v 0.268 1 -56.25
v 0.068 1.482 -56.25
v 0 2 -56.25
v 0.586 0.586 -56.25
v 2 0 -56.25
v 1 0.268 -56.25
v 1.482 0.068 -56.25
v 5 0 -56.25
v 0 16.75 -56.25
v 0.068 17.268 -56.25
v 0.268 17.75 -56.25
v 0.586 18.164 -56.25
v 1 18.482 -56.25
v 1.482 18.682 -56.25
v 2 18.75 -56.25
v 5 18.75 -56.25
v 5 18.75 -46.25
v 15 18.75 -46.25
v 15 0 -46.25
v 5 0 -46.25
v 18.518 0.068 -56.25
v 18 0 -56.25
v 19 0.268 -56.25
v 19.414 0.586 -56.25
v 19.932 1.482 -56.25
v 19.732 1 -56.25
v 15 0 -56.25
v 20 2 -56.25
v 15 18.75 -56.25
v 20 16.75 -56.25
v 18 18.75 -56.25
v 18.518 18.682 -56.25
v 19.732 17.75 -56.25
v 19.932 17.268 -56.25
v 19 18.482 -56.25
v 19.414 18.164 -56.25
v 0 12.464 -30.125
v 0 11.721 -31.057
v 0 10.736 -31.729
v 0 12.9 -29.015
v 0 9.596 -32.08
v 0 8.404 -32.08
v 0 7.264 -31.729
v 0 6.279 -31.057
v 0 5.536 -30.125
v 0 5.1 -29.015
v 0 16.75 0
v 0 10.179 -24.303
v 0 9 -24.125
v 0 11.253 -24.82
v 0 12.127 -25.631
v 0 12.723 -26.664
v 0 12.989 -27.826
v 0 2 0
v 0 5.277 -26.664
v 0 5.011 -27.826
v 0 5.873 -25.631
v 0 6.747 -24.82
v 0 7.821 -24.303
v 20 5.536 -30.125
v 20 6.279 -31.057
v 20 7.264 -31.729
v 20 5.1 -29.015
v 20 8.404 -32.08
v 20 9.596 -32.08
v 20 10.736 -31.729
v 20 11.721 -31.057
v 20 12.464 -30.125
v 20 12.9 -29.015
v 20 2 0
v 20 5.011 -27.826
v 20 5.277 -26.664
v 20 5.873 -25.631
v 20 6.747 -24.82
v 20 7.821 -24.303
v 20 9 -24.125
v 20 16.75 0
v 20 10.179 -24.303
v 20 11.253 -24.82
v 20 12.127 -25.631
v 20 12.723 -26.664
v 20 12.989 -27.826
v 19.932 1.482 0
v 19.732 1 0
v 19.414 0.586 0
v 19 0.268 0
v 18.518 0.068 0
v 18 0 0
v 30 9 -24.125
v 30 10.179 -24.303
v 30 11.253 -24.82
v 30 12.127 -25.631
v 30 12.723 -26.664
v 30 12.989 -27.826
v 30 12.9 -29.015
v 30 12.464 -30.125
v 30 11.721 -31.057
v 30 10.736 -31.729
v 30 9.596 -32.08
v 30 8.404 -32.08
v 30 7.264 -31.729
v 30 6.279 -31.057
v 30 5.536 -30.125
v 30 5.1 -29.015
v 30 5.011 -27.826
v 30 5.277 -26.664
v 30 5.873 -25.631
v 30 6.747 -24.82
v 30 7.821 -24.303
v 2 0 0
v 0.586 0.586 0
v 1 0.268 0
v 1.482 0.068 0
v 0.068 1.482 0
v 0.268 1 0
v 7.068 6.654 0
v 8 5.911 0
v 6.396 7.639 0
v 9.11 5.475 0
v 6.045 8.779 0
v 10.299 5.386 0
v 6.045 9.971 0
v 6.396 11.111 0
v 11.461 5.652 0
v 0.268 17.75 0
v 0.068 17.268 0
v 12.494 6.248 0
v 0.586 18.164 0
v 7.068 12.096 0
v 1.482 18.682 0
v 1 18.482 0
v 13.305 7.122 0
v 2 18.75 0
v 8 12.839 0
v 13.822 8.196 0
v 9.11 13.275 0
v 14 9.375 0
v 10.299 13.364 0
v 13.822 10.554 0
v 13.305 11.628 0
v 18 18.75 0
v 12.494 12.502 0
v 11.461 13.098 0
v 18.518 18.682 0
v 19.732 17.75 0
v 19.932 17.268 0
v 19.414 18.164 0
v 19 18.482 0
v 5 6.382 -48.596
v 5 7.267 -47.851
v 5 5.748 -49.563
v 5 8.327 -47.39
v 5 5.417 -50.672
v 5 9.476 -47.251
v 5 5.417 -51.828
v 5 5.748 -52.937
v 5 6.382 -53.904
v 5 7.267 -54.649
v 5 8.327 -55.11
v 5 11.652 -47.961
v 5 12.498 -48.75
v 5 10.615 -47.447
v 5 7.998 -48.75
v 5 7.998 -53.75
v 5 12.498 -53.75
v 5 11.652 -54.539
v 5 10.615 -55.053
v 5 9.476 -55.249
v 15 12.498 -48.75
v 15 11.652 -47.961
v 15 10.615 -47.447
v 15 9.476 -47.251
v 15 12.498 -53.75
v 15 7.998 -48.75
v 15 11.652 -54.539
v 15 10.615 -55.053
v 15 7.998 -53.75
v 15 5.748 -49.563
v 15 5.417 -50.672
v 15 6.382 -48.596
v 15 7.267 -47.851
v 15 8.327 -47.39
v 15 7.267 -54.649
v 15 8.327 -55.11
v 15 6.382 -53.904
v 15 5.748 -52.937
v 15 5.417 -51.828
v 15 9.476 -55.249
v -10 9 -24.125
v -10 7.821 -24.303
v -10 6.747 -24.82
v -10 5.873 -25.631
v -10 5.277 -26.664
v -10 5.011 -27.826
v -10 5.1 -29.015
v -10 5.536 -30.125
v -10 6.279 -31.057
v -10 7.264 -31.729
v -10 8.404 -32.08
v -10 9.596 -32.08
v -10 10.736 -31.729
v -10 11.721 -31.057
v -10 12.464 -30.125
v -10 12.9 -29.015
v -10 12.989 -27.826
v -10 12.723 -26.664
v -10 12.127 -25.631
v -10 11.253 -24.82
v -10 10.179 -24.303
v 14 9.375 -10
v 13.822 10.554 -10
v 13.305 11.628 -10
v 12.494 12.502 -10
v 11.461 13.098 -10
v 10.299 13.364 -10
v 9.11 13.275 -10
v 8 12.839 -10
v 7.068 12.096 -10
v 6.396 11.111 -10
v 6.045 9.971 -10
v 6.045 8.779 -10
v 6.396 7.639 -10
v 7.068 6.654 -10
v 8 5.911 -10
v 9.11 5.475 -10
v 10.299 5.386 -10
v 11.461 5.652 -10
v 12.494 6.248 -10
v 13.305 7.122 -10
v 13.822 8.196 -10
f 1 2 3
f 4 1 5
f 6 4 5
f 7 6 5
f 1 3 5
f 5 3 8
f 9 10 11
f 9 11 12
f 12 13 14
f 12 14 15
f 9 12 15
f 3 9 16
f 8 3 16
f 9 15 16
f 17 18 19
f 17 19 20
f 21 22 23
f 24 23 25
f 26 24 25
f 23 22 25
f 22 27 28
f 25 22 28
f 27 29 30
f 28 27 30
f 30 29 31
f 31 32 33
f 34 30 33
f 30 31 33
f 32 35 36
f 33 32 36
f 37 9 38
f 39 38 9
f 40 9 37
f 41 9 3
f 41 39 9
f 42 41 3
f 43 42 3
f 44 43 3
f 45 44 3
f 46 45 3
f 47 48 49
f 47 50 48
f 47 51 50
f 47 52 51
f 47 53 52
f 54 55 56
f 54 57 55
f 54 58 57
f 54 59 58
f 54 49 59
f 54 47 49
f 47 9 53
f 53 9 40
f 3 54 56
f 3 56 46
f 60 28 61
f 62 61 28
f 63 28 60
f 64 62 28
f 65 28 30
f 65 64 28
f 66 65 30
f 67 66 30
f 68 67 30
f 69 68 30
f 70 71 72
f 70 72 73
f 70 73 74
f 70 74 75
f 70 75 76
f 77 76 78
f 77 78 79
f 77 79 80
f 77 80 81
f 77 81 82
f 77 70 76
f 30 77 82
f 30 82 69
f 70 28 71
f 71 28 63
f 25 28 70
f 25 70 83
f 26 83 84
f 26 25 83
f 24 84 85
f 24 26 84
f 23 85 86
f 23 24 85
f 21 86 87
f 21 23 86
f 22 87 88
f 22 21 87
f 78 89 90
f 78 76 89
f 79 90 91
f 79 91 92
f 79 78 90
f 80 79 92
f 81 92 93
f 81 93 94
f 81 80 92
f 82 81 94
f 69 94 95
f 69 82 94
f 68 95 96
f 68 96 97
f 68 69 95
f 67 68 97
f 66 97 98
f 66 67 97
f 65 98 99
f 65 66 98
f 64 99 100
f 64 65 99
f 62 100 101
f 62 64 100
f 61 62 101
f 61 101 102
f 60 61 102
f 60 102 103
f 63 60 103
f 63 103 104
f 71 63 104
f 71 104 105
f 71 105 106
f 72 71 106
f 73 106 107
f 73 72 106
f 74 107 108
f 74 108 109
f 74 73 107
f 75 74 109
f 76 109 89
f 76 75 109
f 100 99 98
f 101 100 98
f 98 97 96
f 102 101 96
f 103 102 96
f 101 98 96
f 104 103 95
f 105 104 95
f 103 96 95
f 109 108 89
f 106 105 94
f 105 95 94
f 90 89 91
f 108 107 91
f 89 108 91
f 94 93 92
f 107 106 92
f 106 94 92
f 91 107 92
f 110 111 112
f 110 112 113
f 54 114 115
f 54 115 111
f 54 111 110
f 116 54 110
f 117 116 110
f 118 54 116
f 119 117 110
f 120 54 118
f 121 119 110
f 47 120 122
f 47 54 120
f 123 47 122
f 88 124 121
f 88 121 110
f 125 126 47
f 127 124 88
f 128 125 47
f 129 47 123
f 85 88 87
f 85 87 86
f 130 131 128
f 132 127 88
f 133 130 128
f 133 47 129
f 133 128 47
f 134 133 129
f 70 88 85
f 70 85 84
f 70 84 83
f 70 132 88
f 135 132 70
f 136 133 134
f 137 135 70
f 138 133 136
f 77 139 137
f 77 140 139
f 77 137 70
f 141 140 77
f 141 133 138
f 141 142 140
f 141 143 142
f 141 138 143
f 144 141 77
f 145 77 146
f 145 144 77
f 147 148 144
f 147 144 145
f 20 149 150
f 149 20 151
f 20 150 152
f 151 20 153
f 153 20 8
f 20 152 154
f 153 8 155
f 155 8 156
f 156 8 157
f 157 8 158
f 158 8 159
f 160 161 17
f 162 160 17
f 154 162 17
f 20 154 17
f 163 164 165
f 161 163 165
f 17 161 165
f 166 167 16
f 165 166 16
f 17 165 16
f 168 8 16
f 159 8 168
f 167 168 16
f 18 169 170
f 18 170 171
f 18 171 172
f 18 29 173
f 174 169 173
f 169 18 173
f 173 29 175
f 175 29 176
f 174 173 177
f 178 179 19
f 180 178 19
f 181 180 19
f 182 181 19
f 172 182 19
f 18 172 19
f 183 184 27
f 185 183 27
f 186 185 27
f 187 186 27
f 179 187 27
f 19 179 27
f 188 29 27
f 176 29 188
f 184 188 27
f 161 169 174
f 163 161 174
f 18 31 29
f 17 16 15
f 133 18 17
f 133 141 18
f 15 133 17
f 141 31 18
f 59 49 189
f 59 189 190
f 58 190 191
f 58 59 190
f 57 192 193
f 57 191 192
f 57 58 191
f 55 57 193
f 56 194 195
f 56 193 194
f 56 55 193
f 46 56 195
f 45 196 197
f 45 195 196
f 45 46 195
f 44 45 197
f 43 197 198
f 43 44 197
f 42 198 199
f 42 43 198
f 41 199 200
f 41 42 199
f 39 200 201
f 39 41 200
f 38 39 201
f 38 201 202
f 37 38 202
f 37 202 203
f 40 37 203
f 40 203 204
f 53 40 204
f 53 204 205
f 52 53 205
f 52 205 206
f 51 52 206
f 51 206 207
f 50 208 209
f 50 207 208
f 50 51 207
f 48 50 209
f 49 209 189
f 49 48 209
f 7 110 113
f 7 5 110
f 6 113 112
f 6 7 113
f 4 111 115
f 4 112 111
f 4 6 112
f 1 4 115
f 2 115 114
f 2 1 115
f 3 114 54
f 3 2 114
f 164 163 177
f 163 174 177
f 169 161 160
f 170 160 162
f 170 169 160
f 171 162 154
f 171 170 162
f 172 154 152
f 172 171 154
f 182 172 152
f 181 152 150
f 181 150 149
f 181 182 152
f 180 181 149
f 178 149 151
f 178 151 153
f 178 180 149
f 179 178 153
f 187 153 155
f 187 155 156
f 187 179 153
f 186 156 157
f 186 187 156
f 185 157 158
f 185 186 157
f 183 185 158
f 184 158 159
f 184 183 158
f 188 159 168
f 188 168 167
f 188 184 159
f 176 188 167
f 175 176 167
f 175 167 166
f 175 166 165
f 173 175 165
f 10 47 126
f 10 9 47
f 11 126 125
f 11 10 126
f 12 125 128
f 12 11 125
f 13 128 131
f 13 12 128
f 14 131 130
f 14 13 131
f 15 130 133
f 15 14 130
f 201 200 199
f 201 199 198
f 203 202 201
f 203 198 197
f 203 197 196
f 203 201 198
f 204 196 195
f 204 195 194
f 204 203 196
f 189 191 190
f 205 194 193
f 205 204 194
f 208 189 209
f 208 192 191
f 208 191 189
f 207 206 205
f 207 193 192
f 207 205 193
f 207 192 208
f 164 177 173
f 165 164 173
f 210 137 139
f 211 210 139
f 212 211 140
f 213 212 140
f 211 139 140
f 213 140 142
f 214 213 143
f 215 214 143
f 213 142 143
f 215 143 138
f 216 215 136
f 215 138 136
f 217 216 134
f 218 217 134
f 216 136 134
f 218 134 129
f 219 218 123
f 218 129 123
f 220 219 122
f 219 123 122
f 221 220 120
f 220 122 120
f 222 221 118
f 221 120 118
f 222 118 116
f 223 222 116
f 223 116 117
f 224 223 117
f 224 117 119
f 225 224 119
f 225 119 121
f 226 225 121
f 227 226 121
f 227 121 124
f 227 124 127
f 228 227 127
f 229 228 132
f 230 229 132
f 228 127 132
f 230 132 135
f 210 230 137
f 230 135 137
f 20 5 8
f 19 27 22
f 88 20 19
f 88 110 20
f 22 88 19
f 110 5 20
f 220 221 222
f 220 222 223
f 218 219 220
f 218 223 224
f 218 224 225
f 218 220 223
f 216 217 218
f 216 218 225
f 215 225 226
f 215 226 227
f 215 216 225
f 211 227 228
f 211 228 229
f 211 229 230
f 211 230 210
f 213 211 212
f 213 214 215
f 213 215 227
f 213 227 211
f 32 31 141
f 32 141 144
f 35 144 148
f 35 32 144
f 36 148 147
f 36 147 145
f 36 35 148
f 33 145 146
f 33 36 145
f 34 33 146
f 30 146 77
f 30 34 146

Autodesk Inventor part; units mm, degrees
ref_plane "YZ Plane" through (0, 0, 0) normal (1, 0, 0) x (0, 1, 0)
ref_plane "XZ Plane" through (0, 0, 0) normal (0, 1, 0) x (-1, 0, 0)
sketch "Boceto1" plane through (0, 0, 0) normal (0, 0, 1) x (1, 0, 0)
  line L0 (0, 0) -> (20, 0)
  line L1 (20, 0) -> (20, 18.75)
  line L2 (20, 18.75) -> (0, 18.75)
  line L3 (0, 18.75) -> (0, 0)
  point P0 (9.375, 9.375)
  dimension "d0" = 20
  dimension "d10" = 18.75
extrude "Extrusión1" add sketch "Boceto1" against normal blind 56.25
sketch "Boceto2" plane through (0, 0, 0) normal (0, 0, 1) x (1, 0, 0)
  circle A0 centre (10, 9.375) radius 4
  line L0 (0, 0) -> (20, 0) projected
  line L1 (0, 18.75) -> (0, 0) projected
  point P0 (10, 0)
  point P1 (0, 9.375)
  dimension "d3" = 8
extrude "Extrusión2" cut sketch "Boceto2" against normal blind 10
fillet "Empalme1" radius 2 4 edges at (20, 0, -28.125) (0, 0, -28.125) (0, 18.75, -28.125) (20, 18.75, -28.125)
sketch "Boceto3" plane through (0, 0, -56.25) normal (0, 0, -1) x (-1, 0, 0)
  line L0 (-20, 16.75) -> (-20, 2) projected
  line L1 (-18, 0) -> (-2, 0) projected
  line L2 (-5, 18.75) -> (-15, 18.75)
  line L3 (-15, 18.75) -> (-15, 0)
  line L4 (-15, 0) -> (-5, 0)
  line L5 (-5, 0) -> (-5, 18.75)
  line L6 (-5, 18.75) -> (-15, 0) construction
  line L7 (-15, 18.75) -> (-5, 0) construction
  line L8 (-2, 18.75) -> (-18, 18.75) projected
  point P0 (0, 0)
  point P1 (-10, 10)
  point P2 (-10, 9.375)
  dimension "d11" = 10
extrude "Extrusión3" cut sketch "Boceto3" against normal blind 10
ref_plane "Plano de trabajo4" through (10, 0, 0) normal (1, 0, 0) x (0, 1, 0)
sketch "Boceto5" plane through (0, 2, 0) normal (-1, 0, 0) x (0, 0, 1)
  circle A0 centre (-28.125, 7) radius 4
  line L0 (0, 14.75) -> (0, 0) projected
  line L1 (0, 0) -> (-56.25, 0) projected
  point P0 (0, -2)
  dimension "d20" = 8
  dimension "d21" = 28.125
  dimension "d22" = 7
extrude "Extrusión5" add sketch "Boceto5" along normal blind 10 and the other way blind 30
sketch "Boceto6" plane through (15, 0, -56.25) normal (-1, 0, 0) x (0, 0, 1)
  line L0 (0, 0) -> (56.25, 0) projected
  line L1 (56.25, 13.375) -> (56.25, 5.375) projected
  arc A0 (2.5, 12.4975) -> (7.5, 12.4975) centre (5, 9.375) ccw
  line L2 (2.5, 12.4975) -> (7.5, 12.4975)
  line L3 (7.5, 12.4975) -> (7.5, 7.9975)
  line L4 (7.5, 7.9975) -> (2.5, 7.9975)
  line L5 (2.5, 7.9975) -> (2.5, 12.4975)
  dimension "d38" = 8
  dimension "d39" = 9.375
  dimension "d40" = 51.25
  dimension "d41" = 5
  dimension "d42" = 4.5
extrude "Extrusión6" add sketch "Boceto6" along normal up to next contours L5 L4 L3 A0
properties part number "Ante pierna"
